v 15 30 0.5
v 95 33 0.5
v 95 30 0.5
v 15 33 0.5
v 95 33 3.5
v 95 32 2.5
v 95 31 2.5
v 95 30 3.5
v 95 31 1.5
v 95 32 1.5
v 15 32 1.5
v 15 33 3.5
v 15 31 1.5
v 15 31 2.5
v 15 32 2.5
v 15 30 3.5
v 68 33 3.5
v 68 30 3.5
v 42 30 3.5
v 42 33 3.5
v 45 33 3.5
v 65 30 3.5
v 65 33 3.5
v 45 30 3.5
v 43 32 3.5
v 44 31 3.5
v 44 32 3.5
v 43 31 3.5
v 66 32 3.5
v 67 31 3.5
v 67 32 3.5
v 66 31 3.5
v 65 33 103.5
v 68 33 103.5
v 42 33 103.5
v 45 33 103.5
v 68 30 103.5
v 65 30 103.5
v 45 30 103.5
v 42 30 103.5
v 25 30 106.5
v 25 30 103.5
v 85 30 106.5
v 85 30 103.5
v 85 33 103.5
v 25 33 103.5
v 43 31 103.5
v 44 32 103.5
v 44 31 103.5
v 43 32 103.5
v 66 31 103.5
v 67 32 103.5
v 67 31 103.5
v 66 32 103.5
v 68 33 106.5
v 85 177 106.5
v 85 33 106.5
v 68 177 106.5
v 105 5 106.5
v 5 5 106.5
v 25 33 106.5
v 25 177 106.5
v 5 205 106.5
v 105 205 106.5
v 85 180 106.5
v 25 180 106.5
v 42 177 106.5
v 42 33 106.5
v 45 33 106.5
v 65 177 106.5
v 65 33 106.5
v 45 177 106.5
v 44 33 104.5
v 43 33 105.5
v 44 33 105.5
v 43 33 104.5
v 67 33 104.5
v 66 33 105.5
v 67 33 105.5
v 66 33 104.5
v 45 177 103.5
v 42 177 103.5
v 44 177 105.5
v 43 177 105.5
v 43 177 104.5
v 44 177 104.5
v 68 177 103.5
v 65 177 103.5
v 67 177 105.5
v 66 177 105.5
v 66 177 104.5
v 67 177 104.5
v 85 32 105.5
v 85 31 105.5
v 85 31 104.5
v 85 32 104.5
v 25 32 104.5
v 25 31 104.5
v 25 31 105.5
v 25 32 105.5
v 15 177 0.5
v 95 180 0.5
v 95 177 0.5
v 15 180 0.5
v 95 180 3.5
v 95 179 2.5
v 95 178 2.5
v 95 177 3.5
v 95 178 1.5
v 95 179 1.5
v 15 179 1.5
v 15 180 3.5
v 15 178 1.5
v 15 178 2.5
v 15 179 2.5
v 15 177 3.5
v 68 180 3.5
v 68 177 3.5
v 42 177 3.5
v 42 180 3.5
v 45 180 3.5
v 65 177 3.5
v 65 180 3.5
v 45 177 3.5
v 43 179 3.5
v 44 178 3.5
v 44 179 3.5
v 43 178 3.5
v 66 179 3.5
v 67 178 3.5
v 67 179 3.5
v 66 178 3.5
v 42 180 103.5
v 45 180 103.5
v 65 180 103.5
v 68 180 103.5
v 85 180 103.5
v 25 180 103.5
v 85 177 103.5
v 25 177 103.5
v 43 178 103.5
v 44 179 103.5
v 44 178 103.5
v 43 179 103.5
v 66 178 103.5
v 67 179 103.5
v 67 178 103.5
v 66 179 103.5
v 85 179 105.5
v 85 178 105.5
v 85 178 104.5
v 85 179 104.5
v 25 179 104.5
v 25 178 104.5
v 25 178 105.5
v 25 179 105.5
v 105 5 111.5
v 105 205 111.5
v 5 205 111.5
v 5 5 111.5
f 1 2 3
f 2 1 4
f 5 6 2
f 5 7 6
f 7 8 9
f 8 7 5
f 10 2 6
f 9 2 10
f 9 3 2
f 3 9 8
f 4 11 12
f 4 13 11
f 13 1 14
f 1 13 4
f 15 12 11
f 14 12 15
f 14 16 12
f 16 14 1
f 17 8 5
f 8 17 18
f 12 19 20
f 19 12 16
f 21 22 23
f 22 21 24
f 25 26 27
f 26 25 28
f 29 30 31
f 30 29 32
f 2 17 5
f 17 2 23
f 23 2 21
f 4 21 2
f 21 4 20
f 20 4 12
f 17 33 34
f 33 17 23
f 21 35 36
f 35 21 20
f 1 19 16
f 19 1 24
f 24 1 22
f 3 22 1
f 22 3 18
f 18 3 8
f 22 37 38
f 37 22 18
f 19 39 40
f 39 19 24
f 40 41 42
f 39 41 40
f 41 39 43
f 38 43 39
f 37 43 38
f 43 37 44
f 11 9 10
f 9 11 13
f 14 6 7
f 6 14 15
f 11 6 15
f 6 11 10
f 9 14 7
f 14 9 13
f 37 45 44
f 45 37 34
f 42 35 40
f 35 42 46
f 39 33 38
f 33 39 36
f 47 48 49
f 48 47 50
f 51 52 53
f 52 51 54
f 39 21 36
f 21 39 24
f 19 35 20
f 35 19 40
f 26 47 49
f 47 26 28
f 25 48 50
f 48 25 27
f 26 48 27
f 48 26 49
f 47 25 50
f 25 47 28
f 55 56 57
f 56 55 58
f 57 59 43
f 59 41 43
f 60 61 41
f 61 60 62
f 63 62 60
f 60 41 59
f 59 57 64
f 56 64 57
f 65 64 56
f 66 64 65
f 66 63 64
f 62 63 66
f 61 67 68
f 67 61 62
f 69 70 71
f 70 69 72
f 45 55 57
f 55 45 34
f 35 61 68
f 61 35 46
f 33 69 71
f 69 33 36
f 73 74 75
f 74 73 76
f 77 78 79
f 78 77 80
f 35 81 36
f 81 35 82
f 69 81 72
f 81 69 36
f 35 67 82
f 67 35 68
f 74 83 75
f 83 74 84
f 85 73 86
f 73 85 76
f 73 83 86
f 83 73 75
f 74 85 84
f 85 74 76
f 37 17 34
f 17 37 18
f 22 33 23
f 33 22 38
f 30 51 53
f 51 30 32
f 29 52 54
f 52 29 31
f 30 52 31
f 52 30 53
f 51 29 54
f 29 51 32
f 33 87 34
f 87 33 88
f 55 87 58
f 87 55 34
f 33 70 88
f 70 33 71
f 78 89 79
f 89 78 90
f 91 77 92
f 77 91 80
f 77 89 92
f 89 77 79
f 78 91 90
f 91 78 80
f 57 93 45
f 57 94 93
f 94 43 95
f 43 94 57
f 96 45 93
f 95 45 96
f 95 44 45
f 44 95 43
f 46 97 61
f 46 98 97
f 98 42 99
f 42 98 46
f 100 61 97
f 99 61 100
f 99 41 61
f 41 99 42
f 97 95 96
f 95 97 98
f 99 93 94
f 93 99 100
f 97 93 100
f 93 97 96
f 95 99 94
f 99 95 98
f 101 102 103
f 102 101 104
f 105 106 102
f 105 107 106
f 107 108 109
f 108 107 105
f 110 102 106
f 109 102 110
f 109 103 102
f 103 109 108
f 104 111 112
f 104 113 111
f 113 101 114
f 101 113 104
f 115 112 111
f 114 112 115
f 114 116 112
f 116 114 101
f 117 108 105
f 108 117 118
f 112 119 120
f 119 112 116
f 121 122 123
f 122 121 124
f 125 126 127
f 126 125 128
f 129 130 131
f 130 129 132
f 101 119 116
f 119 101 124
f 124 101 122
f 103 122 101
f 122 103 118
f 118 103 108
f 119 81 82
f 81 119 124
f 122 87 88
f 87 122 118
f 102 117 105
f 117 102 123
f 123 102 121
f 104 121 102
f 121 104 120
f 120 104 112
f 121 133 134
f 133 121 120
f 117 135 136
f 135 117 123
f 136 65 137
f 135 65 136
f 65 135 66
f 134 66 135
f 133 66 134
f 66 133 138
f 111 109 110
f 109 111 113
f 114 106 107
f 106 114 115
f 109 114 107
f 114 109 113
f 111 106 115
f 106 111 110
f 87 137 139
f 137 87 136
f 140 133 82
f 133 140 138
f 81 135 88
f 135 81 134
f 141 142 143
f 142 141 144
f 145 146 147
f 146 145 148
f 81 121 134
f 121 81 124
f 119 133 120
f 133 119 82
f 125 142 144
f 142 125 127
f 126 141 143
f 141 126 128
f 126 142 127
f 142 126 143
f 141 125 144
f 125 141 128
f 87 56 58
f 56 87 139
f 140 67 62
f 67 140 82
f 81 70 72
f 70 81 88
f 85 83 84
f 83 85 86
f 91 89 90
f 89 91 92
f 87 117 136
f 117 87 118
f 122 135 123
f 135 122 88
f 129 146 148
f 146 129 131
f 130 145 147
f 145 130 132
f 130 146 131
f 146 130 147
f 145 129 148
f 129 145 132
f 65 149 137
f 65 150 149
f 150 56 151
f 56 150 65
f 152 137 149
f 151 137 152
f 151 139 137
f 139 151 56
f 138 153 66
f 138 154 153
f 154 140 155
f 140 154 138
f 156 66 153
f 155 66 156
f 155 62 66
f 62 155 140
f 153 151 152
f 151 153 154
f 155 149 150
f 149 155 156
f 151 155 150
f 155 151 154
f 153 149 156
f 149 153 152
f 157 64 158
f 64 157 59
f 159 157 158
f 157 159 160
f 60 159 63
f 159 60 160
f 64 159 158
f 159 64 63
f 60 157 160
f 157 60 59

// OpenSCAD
room_width = 225;
room_lenght = 305;
room_height = 260;
door_lenght = 78;
door_height = 205;
door_diff = 67;   // from wall to door
wall_thickness = 1;

module room(
    show_room = true,
    show_bed = true,
    desk_style,
    
    base_size = 4.5,
    base_thickness = 0.2,
    leg_deep = 80,
    leg_heigth = 100,
    desk_base_deep = 60,
    desk_base_width = 120,
    tabletop = [150, 80, 5],
    between_legs = 20,
    tabletop_width = 150,
    tabletop_deep = 80,
    tabletop_thickness = 5

){
    module room_wall() {
        color("LightSkyBlue")
        difference() {
            
        translate( [0, 0, 0])
        cube([room_lenght+wall_thickness, room_width+wall_thickness, room_height]);
          
        translate( [wall_thickness+1, wall_thickness/2, wall_thickness/2])
        cube([room_lenght, room_width, room_height+1]);
            
        translate( [door_diff, wall_thickness, wall_thickness])
        cube([door_lenght, room_lenght+wall_thickness, door_height]);
        
        }
    }
    
    module bed() {
        bed_width = 134;
        bed_height = 60;
        color("brown")
        translate( [room_lenght-bed_width, wall_thickness/2, 0.5])
        cube([bed_width, room_width, bed_height]);
    }
    
    module button() {
        button_size = 5;
        button_death = 2;
        z_position = 74;
        x_position = 48.5;
        color("white")
        translate([x_position, room_width, z_position])
        rotate([90, 0, 0])
        cube([button_size, button_size, button_death]);
    }
    
    module old_desc() {
        locker_death = 44;
        locker_width = 39;
        locker_height = 119;
        box_thickness = 3;
        box_width = 42 - (box_thickness * 2);
        box_togheter = 65;
        box = box_togheter - box_thickness;
        tabletop_leg_margin = 5;
        difference(){
            linear_extrude(75) {
            points = [[0,0], [70,0], [70,42], [45,42], [45,130], [0,130]];
            paths = [[0, 1, 2, 3, 4, 5, 6]];
            polygon(points = points, paths = paths, convexity = 10);
            }
            for (x = [-1:0])
		    translate ([-10, box_thickness, tabletop_leg_margin + x * box_togheter])
                cube([100, 42 - 2*box_thickness, box]);
            translate([2, 42, -0.5])
                cube([50, 85+box_thickness, 75-tabletop_leg_margin]);
            translate([-10, 42, -0.5])
                cube([80, 85+box_thickness, 26]);
        }
        
        translate([-27-10, 75, 0])
            cube([27, 27, 80]);
        
        color("black")
        translate([-25, 65, 80])
            cube([5, 50, 35]);
    }

    module locker() {
        locker_death = 44;
        locker_width = 39;
        locker_height = 119;
        box_n = 5;
        box_thickness = 3;
        box_width = locker_width - (box_thickness * 2);
        box_togheter = 19;
        box = box_togheter - box_thickness;
        tabletop_leg_margin = 5;
        difference(){
        cube([locker_death, locker_width, locker_height]);
            for (x = [-1:box_n])
		    translate ([box_thickness/2, box_thickness,
            tabletop_leg_margin + x * box_togheter])
		    cube([
            locker_death+10, 
            locker_width - 2*box_thickness,
            box]);
        }
    }
    
    
    module office_desk() {
        thickness = 2;
        height = 70;
        deep = 70;
        width = 150;
        side_deep = 50;
        translate([0, 0, height - thickness])
        cube([deep, width, thickness]);
        
        translate([(deep-side_deep)/2, 0, 0])
        cube([side_deep, thickness, height - thickness]);
        translate([(deep-side_deep)/2, width - thickness, 0])
        cube([side_deep, thickness, height - thickness]);
        translate([0, width+5, 0])
        locker();
    }
    
    
    module new_desk(

    ) {
        module base(
        length
        ) {
            difference(){
            cube([base_size, base_size, length]);
            translate([base_thickness/2, base_thickness/2, -1])
            cube(
                [
                    base_size-base_thickness, 
                    base_size-base_thickness, 
                    length +2
                ]);
            }
        }    

        module frame(){
            leg_margin = (leg_deep - between_legs - 2 * base_size) / 2;
            for ( i = [0:1])
            translate([0, i*desk_base_width, 0])
            mirror( [0, i, 0] )
            color("black")
            union(){
            rotate([0, 90, 0])        
            base(length=leg_deep);
                
            for (x = [0:1])
                rotate([0, 0, -90])
                translate(
                    [-base_size, 
                    leg_margin + x *(between_legs + base_size),
                    0])
                union(){
                base(length=leg_heigth);
                translate([0, 0, leg_heigth])
                rotate([0, -90, 0])
                base(length=desk_base_width/2);
                }
            
            translate(
                [
                    (leg_deep-desk_base_deep)/2, 
                    0, 
                    leg_heigth+base_size
                ])
            rotate([0, 90, 0])
            base(length=desk_base_deep);
            }
        }
        color("white")
        translate([0, 0, leg_heigth + 2*base_size])
        cube([tabletop_deep, tabletop_width, tabletop_thickness]);
        translate([
            (tabletop_deep - leg_deep) /2,
            (tabletop_width - desk_base_width) / 2, 
            base_size])
        frame();
        
    }
        

    if (show_room) {
        room_wall();
        button();
    }
    if (show_bed) {
        bed();
    }
    
    if (desk_style == "current"){
        translate([42, 15, 0])
        old_desc();
        
        translate([42, 15 + 130, 0])
        locker();
    }
    
    if (desk_style == "office"){
        translate([5, 5, 0])
        color("white")
        office_desk();
    }
    
    if (desk_style == "new"){
        translate([5, 5, 0.5])
        new_desk();
    }
}
    
room(
    show_room=false,             // true or false. Около двери выключатель
    show_bed=false,              // true or false
    desk_style="new",            // new, current, office

// Настройки работают только для new
    base_size = 3,            // размер швеллера в см
    base_thickness = 2,       // толщина швеллера в см
    tabletop_width = 200,       // ширина столешницы в см
    tabletop_deep = 100,         // глубина столешницы в см
    tabletop_thickness = 5,     // толщина столешницы в см
    leg_deep = 80,              // глубина ножек в основании (около пола) в см
    between_legs = 20,          // расстояние между ножками
    leg_heigth = 100,           // высота ножек (без учета швеллера) в см
    desk_base_deep = 60,        // глубина основания под столешницу в см
    desk_base_width = 150       // ширина всей рамы под столешницей
);
